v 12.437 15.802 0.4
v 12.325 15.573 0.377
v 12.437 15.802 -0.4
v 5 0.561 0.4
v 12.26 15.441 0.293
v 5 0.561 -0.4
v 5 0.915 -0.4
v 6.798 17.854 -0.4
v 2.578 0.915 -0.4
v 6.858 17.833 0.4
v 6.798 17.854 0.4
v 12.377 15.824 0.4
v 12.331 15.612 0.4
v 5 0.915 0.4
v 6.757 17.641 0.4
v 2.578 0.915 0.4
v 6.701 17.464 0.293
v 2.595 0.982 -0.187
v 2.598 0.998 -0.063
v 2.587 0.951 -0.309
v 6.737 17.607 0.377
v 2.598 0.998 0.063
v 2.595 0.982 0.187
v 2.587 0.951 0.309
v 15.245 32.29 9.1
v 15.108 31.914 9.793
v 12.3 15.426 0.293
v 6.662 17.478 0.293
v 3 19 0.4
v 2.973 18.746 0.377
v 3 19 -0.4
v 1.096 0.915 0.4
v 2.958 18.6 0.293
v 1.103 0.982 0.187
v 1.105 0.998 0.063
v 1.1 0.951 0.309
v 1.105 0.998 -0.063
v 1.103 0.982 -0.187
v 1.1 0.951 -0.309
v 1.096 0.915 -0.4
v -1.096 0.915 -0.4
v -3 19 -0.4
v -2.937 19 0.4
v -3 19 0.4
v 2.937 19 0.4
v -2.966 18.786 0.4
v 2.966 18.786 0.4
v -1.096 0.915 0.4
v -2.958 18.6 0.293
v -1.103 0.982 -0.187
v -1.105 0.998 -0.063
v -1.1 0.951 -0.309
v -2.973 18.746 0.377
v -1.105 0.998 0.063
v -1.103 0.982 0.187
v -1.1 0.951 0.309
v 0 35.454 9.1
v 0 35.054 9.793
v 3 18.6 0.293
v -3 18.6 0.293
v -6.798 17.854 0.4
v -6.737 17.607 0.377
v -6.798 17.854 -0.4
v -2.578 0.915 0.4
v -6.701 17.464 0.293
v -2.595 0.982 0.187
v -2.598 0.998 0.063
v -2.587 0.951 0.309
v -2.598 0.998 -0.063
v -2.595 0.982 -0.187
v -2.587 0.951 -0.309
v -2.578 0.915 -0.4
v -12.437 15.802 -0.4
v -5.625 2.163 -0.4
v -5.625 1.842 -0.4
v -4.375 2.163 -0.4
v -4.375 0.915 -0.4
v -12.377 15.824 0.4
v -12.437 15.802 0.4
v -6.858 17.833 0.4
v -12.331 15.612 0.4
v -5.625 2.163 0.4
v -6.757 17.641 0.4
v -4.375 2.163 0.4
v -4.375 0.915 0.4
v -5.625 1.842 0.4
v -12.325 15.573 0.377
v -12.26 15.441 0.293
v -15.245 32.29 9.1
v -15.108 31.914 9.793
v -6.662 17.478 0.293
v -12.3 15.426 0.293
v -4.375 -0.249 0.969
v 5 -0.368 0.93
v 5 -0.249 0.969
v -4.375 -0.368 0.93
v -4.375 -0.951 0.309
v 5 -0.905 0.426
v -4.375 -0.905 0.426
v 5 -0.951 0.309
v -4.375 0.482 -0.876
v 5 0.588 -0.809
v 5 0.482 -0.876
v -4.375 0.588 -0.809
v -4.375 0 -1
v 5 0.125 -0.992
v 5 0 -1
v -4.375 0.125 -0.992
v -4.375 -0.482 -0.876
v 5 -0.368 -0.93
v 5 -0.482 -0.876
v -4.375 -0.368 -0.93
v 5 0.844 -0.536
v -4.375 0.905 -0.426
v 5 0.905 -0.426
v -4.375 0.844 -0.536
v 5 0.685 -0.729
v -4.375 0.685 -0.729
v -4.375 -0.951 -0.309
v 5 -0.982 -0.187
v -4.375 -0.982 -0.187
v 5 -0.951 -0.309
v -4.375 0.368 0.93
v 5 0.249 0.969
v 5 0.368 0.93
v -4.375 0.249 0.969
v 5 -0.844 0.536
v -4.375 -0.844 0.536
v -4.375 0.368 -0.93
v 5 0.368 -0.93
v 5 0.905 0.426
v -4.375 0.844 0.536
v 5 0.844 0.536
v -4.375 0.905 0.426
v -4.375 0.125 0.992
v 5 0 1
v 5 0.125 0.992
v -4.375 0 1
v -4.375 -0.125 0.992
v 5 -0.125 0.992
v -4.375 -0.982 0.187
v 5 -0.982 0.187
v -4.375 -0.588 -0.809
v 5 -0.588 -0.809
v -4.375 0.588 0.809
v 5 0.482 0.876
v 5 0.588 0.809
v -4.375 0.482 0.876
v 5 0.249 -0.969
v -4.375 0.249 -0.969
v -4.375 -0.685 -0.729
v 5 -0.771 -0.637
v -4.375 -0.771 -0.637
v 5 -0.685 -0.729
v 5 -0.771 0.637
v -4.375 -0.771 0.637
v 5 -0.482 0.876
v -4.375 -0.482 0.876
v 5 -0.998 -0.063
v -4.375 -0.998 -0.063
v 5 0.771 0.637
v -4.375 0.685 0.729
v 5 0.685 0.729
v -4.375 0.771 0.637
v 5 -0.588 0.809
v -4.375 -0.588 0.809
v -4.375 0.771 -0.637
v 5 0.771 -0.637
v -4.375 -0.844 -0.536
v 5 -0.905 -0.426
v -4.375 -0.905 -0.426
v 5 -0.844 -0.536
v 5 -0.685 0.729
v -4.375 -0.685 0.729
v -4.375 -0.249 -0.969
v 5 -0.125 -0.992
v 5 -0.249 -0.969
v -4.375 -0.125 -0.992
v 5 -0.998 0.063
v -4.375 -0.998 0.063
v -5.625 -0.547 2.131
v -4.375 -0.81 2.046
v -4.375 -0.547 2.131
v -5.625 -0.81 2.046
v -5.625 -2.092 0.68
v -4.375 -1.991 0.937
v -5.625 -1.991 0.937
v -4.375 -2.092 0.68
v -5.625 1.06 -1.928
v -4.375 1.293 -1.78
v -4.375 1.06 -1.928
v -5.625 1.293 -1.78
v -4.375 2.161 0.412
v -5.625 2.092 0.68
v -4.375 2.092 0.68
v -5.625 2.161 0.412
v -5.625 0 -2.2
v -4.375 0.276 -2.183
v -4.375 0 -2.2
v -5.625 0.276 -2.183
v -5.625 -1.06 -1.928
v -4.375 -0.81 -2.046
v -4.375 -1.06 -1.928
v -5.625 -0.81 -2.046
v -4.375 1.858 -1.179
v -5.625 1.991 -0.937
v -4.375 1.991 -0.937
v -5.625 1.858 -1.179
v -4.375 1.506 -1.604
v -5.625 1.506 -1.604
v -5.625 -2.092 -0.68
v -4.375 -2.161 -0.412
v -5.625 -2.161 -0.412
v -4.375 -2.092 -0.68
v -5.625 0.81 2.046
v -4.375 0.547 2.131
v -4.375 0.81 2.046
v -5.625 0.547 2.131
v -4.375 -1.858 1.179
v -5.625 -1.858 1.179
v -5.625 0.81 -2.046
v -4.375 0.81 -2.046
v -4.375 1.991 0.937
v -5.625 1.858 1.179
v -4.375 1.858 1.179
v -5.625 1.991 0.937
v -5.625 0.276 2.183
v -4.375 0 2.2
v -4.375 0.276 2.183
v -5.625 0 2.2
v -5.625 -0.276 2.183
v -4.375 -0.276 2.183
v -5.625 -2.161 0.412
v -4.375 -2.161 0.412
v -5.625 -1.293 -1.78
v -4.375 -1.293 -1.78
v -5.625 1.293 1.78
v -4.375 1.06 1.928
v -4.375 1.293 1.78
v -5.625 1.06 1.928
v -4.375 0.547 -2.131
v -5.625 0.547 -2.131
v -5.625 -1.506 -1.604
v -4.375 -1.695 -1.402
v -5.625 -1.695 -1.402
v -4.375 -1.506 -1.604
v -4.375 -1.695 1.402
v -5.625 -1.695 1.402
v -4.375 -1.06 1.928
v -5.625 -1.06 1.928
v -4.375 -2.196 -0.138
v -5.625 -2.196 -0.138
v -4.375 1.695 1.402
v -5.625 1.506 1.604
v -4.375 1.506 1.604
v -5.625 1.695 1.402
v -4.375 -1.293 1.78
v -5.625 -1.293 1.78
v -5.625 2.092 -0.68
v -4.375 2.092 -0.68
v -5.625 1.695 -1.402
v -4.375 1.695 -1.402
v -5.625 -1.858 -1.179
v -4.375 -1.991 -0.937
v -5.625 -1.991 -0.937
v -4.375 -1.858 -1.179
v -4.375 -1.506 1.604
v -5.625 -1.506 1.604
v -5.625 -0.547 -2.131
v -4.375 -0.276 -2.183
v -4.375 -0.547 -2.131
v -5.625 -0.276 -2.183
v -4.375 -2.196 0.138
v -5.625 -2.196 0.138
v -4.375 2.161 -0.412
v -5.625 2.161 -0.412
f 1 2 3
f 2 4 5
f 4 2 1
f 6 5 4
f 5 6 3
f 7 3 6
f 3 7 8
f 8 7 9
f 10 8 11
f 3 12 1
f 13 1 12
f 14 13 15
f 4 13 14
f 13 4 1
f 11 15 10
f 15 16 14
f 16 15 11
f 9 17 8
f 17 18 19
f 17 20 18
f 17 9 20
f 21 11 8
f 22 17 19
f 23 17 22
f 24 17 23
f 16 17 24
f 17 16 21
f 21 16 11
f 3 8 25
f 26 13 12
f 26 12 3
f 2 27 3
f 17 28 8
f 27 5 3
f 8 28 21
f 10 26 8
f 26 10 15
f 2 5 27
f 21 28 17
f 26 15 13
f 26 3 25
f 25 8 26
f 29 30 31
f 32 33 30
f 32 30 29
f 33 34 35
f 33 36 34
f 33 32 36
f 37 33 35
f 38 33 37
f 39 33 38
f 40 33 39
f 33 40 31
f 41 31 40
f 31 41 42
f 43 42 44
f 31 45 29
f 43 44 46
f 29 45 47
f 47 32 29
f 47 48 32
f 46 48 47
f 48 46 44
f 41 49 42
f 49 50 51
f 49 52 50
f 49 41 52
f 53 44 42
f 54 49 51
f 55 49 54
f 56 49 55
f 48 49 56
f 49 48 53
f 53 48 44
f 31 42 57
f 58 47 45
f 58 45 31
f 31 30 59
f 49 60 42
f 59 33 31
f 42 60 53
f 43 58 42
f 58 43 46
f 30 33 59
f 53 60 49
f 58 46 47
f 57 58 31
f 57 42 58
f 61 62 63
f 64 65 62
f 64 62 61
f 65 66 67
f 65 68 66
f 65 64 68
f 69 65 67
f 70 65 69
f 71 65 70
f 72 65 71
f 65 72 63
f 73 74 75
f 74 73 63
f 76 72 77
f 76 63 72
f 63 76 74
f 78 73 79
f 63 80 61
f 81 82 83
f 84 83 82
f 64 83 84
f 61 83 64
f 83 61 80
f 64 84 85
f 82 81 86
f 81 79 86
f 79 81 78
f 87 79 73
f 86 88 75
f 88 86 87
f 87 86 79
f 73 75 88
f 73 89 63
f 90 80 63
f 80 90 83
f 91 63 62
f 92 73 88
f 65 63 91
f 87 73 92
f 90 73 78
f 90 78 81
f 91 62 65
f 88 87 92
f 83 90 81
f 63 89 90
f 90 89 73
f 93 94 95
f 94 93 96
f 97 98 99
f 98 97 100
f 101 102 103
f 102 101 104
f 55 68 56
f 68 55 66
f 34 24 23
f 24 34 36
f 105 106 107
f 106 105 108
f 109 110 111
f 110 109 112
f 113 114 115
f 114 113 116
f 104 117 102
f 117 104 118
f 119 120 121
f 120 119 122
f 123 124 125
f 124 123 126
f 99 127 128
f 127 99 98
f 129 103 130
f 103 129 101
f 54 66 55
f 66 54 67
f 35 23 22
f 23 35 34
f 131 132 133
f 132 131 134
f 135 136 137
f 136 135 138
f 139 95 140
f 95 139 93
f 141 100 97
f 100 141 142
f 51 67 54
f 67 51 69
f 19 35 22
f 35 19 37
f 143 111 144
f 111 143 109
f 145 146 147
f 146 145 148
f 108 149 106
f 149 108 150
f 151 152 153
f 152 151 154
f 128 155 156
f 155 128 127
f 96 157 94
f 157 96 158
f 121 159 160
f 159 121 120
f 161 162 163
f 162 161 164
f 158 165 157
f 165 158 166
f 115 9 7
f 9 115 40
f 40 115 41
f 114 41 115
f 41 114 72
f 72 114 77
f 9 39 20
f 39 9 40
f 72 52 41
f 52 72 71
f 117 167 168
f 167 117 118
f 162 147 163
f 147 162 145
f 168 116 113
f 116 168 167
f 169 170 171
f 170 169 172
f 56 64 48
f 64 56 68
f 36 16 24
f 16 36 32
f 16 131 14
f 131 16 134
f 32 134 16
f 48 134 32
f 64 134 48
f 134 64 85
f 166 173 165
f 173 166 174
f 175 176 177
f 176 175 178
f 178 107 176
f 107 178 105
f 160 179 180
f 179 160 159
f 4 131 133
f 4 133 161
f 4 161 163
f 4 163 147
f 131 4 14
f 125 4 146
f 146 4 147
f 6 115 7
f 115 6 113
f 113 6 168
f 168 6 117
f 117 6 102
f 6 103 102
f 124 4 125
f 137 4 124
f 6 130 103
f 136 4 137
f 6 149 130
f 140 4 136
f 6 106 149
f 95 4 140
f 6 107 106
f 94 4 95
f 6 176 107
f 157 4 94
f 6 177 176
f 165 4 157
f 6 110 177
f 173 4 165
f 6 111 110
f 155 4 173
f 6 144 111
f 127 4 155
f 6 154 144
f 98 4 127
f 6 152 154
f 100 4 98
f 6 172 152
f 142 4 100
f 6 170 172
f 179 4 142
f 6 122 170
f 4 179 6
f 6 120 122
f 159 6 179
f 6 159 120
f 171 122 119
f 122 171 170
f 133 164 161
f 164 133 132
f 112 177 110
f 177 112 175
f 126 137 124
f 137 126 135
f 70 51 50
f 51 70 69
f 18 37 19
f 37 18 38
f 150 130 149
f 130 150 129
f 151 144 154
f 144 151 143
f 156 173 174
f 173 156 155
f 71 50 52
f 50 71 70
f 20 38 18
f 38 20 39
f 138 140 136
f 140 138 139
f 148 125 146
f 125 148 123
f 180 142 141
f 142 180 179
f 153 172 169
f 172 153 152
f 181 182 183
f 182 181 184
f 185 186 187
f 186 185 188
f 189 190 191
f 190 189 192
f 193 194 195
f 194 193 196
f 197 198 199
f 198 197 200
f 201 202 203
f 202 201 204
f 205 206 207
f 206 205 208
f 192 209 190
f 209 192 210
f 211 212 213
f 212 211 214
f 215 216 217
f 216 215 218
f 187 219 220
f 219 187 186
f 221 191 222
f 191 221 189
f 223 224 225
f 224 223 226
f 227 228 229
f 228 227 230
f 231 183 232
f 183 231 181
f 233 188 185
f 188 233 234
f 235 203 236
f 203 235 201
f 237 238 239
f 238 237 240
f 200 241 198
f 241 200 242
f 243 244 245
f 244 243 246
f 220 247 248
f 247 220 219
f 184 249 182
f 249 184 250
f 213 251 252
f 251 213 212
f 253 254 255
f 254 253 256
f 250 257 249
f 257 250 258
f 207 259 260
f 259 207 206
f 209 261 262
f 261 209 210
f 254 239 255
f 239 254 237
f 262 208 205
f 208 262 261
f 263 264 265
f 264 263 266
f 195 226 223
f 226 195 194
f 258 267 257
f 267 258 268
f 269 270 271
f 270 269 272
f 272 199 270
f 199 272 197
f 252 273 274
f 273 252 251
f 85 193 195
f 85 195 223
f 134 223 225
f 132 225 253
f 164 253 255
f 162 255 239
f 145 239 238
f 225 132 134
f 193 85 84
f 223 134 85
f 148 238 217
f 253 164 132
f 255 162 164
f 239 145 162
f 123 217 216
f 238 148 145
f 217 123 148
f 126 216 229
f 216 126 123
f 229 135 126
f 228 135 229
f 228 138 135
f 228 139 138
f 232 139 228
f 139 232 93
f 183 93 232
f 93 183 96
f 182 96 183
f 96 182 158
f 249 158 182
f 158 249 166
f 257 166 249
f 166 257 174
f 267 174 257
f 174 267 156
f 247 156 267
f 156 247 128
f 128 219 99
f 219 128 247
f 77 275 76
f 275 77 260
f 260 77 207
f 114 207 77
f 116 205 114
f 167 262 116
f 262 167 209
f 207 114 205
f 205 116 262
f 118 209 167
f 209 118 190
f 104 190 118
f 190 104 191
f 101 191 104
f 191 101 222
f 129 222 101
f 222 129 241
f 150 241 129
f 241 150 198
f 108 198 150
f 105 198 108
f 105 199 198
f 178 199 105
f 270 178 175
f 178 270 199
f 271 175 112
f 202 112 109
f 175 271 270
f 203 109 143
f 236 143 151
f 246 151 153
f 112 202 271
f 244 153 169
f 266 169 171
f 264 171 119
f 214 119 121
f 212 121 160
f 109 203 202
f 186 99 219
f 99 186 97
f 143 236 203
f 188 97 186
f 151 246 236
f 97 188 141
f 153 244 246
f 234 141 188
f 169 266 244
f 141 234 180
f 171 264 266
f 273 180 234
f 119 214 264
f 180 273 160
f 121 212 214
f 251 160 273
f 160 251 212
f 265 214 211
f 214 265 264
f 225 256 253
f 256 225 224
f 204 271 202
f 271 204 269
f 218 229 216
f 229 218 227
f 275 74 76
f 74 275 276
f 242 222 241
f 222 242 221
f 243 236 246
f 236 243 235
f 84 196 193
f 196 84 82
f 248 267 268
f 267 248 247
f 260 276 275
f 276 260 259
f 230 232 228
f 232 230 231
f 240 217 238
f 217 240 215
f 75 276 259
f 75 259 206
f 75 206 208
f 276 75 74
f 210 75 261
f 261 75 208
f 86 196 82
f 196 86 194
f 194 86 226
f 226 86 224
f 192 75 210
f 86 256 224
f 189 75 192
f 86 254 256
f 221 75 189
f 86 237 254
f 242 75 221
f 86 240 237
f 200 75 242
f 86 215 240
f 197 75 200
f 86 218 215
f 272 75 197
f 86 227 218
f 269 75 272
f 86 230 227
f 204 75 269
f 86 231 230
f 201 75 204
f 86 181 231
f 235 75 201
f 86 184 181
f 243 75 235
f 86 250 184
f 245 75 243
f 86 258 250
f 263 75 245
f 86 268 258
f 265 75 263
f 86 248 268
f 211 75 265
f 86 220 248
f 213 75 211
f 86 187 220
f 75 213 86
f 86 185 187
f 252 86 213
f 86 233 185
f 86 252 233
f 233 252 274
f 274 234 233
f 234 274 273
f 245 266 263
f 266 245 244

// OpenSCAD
// file: constants.scad
$fn = 50;

leaf_x = 6;
leaf_y = 19;
leaf_z = 0.8;
leaf_angle = 30;
leaf_wide_angle = 20;
leaf_open_angle = 90;
leaf_slide_angle = 50;
leaf_radius = 12;
leafs = 6;

axis_length = 10;
axis_radius = 1;
bearing_length = 1.25;
tolerance = 0.1;
// main file
include <constants.scad>

module sub_leaf() {
    translate([0, 0, -leaf_z/2]) {
        linear_extrude(leaf_z) polygon([[2*leaf_x/3, 0], [leaf_x/3, 0],
                                        [0,leaf_y], [leaf_x,leaf_y]]);
        translate([0, leaf_y, 0]) 
            rotate([leaf_angle, 0, 0])
                linear_extrude(leaf_z) polygon([[0,0],[leaf_x/2,leaf_y],[leaf_x,0]]);
    }
}

module three_leaves() {      
    difference() {
        union() {
            color([0.1, 0.3, 0.2, 1]) 
                translate([leaf_x/20, 0, 0]) 
                    rotate([0, 0, -leaf_wide_angle])
                        sub_leaf();
            
            color([0.2, 0.5, 0.2, 1]) 
                translate([-leaf_x/2, 0, 0])
                    sub_leaf();
            
            color([0.1, 0.99, 0.1, 1]) 
                translate([-leaf_x/20, 0, 0])
                    rotate([0, 0, leaf_wide_angle]) 
                        translate([-leaf_x, 0, 0])
                            sub_leaf();
        }
        // remove central corners
        translate([0, -axis_radius, 0])
            cube([axis_length, 2*axis_radius, axis_radius], center=true);
    }
 
    // axis
    color([0.3, 0.70, 0.3, 1]) rotate([0, 90, 0])
        cylinder(axis_length, axis_radius, axis_radius, center=true);

    // cogged wheel
    color([0.5, 0.70, 0.5, 1]) translate([-axis_length/2, 0, 0]) rotate([0, 90, 0])
        cylinder(bearing_length, axis_radius*2.2, axis_radius*2.2, center=true);

}

// main
three_leaves();
